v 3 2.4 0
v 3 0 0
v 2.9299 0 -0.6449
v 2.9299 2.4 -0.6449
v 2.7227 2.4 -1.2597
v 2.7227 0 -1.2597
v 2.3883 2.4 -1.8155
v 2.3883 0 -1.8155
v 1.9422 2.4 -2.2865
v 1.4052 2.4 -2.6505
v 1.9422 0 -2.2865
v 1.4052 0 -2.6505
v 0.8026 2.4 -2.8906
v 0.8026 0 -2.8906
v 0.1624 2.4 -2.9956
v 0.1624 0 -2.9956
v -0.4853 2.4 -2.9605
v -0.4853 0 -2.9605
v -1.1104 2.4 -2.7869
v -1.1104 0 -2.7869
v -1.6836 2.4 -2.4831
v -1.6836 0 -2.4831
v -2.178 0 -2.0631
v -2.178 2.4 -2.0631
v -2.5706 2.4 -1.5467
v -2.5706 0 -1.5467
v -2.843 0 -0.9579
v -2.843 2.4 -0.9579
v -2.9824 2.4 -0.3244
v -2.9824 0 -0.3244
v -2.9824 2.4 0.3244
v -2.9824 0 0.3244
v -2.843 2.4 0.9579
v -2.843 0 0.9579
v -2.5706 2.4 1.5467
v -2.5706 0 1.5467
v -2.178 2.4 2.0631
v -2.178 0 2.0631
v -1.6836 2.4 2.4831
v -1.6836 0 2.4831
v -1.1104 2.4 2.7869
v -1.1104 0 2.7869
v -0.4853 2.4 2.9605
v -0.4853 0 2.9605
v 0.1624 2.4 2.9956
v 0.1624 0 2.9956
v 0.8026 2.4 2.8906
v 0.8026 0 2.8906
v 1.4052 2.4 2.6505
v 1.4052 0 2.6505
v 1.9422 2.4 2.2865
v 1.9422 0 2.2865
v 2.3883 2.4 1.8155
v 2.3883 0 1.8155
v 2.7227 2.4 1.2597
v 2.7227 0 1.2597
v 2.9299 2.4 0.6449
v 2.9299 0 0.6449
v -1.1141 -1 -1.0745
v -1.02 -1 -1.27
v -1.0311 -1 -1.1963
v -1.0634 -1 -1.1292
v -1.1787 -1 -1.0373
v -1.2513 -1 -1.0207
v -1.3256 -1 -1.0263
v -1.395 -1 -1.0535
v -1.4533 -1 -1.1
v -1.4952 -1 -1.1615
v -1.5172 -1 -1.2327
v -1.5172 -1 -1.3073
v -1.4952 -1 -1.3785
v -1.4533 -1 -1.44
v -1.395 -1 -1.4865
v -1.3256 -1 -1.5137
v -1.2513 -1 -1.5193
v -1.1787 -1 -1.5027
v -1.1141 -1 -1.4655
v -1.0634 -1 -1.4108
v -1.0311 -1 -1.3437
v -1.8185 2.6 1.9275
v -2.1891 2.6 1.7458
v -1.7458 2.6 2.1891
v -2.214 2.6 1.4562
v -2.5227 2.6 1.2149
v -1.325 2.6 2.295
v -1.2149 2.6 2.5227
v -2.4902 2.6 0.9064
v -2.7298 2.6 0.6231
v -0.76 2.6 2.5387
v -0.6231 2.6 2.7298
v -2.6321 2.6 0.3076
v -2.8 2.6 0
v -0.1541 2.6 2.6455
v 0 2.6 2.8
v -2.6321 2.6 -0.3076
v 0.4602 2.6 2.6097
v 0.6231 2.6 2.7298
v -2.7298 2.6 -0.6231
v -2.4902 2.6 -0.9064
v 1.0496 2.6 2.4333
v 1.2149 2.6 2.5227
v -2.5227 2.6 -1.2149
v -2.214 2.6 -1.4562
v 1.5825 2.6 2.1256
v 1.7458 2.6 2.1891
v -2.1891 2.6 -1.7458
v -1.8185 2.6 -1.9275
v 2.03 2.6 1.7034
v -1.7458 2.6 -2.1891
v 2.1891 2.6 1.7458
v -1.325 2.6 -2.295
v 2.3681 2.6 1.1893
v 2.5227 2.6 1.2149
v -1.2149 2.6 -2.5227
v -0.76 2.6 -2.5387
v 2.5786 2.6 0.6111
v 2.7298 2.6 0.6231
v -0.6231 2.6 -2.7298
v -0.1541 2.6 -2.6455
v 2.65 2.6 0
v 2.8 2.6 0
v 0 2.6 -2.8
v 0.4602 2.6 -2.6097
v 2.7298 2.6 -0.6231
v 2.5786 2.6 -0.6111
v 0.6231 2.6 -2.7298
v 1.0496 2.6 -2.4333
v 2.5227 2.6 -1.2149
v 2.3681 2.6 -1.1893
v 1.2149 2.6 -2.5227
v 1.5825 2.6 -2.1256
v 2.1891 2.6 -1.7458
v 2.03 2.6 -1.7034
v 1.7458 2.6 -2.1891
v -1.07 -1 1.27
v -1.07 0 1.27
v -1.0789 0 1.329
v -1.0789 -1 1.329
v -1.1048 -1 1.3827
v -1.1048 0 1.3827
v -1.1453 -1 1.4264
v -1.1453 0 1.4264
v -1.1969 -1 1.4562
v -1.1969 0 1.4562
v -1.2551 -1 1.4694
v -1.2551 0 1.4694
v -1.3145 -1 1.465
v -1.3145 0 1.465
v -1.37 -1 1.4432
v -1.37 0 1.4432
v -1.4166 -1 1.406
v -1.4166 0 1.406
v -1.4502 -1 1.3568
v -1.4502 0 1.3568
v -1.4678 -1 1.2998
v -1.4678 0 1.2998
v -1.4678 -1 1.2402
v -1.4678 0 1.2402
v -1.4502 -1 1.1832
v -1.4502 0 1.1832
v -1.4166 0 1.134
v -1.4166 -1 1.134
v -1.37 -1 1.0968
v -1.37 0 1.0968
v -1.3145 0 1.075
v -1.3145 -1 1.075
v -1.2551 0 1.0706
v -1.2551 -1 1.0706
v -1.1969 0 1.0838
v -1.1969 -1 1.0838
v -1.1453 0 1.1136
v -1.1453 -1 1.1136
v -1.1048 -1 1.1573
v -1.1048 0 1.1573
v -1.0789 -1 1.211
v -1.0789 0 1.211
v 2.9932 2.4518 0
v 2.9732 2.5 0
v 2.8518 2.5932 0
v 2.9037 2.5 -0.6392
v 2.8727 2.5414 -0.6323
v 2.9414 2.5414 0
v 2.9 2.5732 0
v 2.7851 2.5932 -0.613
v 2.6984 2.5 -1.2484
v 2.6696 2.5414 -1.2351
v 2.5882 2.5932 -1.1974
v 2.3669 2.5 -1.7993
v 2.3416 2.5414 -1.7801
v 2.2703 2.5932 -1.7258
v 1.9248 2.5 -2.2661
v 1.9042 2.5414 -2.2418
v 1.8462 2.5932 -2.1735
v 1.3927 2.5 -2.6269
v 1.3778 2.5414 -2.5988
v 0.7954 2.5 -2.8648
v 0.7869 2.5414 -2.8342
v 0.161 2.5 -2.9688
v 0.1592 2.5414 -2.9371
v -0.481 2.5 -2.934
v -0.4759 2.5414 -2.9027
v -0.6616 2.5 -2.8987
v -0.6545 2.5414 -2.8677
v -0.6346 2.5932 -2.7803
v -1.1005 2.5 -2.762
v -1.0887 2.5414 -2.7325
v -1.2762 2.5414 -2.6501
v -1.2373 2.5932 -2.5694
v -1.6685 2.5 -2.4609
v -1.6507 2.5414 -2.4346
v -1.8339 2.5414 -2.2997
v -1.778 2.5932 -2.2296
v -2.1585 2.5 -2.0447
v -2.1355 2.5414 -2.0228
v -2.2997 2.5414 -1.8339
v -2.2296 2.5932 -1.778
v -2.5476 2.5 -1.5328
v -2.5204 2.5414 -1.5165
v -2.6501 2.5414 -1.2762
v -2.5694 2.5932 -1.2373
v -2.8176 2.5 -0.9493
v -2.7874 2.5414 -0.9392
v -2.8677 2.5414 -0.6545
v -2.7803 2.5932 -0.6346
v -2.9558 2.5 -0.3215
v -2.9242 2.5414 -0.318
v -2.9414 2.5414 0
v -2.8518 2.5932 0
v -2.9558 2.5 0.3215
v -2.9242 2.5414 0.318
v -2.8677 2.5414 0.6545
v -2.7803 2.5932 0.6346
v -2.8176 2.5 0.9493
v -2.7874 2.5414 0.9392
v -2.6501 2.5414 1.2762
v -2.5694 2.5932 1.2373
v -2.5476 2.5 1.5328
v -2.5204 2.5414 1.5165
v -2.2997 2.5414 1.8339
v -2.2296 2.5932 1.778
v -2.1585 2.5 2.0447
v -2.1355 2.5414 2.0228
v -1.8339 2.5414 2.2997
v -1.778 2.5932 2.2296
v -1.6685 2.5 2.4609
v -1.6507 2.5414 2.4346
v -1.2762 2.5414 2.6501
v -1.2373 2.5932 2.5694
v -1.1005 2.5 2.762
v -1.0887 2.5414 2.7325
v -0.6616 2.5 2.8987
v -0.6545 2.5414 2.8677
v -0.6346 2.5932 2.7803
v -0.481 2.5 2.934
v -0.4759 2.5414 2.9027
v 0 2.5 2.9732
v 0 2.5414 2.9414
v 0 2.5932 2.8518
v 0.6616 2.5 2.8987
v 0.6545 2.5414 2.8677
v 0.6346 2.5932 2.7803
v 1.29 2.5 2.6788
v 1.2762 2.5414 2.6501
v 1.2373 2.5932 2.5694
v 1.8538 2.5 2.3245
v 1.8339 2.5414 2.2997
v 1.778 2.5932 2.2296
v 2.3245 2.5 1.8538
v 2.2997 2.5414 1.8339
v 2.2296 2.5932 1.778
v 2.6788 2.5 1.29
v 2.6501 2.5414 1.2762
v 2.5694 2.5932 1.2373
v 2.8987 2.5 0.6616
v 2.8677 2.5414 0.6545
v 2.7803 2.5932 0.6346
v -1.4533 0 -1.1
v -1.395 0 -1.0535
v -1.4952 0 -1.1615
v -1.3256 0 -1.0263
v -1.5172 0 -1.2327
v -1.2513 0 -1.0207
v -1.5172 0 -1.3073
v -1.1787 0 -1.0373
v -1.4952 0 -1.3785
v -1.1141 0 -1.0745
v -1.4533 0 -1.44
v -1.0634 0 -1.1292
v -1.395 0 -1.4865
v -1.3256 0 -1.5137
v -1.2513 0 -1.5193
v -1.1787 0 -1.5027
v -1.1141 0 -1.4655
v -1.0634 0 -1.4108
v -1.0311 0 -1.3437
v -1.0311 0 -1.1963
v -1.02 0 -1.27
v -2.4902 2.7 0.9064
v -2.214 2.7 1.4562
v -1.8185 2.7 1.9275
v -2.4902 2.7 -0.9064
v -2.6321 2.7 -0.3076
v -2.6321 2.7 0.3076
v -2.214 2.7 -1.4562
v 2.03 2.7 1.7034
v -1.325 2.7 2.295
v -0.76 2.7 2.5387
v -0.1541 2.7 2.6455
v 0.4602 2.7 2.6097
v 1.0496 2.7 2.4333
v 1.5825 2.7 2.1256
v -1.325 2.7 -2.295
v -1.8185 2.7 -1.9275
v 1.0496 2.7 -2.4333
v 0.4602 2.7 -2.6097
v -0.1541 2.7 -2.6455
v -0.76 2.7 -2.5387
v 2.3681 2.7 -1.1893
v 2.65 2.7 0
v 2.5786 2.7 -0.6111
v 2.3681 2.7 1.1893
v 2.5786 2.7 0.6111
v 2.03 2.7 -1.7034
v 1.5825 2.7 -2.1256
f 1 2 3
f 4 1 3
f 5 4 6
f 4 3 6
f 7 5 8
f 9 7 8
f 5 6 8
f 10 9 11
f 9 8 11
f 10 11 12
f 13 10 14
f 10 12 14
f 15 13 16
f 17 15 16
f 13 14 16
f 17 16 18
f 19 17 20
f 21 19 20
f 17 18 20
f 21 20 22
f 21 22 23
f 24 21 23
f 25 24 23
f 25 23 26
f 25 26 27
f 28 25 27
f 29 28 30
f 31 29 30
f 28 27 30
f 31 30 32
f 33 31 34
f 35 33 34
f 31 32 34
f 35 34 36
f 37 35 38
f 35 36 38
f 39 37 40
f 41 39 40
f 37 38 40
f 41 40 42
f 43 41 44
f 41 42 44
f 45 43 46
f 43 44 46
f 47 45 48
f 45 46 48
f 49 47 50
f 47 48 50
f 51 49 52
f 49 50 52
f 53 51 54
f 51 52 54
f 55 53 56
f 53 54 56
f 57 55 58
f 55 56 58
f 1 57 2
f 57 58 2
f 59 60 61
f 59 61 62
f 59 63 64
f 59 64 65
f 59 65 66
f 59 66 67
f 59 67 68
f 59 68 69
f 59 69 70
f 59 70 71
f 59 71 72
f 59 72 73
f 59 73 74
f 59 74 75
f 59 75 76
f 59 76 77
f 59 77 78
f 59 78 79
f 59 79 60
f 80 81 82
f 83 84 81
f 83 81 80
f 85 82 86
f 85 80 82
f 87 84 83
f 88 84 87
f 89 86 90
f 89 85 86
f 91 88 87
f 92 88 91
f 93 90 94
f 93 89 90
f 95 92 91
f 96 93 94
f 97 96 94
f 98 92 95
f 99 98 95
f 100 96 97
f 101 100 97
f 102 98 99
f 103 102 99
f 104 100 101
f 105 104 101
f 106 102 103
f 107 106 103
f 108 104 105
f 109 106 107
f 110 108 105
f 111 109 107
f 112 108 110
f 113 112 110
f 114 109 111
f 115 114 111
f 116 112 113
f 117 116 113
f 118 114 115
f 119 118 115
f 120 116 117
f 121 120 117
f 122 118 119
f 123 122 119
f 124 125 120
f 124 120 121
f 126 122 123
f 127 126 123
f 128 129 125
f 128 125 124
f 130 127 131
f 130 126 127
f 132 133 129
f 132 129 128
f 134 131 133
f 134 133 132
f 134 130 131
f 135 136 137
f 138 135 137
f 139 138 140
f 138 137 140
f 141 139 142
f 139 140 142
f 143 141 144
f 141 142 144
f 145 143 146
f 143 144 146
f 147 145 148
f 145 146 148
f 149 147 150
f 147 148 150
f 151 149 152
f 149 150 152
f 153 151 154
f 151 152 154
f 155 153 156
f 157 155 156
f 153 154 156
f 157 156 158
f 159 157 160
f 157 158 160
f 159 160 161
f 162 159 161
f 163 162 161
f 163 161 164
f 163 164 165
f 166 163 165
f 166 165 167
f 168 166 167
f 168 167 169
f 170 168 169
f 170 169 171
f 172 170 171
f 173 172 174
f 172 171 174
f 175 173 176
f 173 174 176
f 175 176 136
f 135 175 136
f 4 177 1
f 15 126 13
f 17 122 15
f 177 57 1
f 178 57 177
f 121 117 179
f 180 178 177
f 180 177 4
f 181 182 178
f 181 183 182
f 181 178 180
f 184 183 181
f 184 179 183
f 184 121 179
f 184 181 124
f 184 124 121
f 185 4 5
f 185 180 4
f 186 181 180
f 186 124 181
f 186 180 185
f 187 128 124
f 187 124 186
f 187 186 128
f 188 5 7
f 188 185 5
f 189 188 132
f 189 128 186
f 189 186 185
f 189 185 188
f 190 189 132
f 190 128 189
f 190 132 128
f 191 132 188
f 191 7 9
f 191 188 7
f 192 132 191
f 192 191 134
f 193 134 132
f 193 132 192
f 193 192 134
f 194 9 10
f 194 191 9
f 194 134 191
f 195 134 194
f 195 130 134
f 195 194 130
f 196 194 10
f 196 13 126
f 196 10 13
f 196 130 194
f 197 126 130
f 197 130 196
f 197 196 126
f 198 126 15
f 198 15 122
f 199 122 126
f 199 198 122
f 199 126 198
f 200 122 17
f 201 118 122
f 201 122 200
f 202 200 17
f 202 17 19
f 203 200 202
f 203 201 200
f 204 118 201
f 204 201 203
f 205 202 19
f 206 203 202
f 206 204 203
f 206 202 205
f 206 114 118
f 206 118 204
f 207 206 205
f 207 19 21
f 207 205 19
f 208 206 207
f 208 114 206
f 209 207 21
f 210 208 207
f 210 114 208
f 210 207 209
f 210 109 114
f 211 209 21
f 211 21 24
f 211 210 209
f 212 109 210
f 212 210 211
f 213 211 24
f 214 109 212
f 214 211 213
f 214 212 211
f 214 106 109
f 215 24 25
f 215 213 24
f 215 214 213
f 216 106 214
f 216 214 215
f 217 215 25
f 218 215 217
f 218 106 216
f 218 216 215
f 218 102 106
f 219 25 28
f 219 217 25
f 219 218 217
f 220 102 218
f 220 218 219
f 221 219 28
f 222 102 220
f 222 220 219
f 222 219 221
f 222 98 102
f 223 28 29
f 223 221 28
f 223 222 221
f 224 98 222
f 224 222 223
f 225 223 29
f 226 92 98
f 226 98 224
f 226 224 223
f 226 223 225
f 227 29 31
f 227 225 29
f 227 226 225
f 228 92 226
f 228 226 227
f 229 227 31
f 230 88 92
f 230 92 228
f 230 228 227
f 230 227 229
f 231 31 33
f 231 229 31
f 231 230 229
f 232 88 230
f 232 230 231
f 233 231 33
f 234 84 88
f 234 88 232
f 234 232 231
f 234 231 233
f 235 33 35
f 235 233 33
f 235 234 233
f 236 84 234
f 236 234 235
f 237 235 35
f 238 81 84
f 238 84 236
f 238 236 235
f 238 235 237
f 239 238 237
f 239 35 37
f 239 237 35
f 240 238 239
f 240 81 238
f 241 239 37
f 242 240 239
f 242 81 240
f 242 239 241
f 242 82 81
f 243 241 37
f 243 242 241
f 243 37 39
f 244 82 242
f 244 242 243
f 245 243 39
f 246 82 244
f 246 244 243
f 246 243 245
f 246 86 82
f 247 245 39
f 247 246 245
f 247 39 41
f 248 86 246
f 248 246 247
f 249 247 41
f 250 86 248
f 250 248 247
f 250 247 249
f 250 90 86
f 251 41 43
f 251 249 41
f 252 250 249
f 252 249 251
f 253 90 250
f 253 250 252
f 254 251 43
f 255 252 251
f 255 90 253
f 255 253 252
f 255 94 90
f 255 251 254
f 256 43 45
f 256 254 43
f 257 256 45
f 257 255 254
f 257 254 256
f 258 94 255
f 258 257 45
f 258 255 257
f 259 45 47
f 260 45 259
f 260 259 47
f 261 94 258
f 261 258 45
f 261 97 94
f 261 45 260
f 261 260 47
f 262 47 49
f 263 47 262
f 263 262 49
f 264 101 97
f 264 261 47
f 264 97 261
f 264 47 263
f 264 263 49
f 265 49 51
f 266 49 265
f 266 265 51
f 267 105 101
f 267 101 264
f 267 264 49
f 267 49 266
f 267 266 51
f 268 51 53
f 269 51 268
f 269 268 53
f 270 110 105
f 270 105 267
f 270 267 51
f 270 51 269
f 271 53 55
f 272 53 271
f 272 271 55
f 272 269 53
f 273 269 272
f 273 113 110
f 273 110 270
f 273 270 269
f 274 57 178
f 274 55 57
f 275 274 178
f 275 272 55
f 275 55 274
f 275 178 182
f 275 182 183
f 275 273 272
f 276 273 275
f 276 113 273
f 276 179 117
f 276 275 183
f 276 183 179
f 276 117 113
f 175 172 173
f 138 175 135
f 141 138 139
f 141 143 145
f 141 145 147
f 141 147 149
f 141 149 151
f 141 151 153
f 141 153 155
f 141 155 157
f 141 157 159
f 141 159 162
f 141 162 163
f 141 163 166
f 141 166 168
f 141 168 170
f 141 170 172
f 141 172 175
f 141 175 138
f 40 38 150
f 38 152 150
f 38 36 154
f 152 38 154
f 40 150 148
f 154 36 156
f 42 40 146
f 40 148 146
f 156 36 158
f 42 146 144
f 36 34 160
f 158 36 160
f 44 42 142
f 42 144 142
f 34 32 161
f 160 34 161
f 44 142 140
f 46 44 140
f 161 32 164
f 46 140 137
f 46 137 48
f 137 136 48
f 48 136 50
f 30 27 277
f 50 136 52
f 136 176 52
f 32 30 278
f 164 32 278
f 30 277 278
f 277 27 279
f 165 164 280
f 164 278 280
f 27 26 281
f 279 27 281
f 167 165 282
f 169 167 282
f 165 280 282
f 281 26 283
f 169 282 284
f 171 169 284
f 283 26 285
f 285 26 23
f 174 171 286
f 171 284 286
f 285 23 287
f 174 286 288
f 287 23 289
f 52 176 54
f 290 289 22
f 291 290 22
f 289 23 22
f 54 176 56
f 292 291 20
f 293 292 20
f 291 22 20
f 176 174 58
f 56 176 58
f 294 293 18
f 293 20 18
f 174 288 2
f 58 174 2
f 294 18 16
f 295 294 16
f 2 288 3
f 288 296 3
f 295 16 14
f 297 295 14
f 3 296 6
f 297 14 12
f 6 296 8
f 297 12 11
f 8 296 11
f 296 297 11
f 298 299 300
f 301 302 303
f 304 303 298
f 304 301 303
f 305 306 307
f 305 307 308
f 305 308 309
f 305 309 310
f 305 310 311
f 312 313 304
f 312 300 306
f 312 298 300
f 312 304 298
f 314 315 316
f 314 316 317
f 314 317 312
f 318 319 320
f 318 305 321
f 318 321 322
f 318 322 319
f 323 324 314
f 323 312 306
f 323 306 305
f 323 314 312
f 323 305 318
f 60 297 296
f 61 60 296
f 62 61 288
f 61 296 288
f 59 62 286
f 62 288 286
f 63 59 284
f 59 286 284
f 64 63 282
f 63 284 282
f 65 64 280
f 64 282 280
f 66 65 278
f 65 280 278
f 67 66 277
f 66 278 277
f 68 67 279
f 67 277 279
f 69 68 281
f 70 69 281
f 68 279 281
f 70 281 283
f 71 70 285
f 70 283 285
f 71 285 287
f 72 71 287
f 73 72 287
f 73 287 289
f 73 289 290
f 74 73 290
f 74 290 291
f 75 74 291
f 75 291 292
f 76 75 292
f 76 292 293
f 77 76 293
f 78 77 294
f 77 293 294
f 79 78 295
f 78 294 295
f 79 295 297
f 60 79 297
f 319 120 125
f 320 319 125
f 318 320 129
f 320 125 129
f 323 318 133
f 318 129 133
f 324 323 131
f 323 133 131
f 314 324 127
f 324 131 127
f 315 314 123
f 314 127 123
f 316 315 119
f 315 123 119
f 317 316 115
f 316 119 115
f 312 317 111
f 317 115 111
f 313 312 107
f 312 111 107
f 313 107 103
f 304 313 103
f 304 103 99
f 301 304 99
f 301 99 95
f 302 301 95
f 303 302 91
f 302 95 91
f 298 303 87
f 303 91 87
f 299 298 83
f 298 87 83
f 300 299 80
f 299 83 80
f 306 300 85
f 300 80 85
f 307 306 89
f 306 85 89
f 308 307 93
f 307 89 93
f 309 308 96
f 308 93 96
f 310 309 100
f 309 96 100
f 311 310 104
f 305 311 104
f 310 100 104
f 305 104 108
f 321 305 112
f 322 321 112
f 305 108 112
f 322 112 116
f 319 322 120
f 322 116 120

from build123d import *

# Parameters (mm, degrees)
SKETCH1_R           = 3
BOSS_EXTRUDE1_DEPTH = 2.6
FILLET1_R           = 0.2
SKETCH2_R           = 2.65
BOSS_EXTRUDE2_DEPTH = 0.1
SKETCH3_R           = 0.2
SKETCH3_R_2         = 0.25
BOSS_EXTRUDE3_DEPTH = 1


with BuildPart() as part:
    # Sketch1 → Boss-Extrude1 (new body)
    with BuildSketch(Plane(origin=(0, 0, 0), x_dir=(1, 0, 0), z_dir=(0, 1, 0))):
        Circle(SKETCH1_R)
    extrude(amount=BOSS_EXTRUDE1_DEPTH)

    # Fillet1
    fillet1_edges = [part.edges().sort_by_distance(p)[0] for p in [
        (-3, 2.6, 0),
    ]]
    fillet(fillet1_edges, radius=FILLET1_R)

    # Sketch2 → Boss-Extrude2 (add)
    with BuildSketch(Plane(origin=(0, 2.6, 0), x_dir=(1, 0, 0), z_dir=(0, 1, 0))):
        Circle(SKETCH2_R)
    extrude(amount=BOSS_EXTRUDE2_DEPTH)

    # Sketch3 → Boss-Extrude3 (add)
    with BuildSketch(Plane.XZ):
        with Locations((-1.27, 1.27)):
            Circle(SKETCH3_R)
        with Locations((-1.27, -1.27)):
            Circle(SKETCH3_R_2)
    extrude(amount=BOSS_EXTRUDE3_DEPTH)


solid = part.part
